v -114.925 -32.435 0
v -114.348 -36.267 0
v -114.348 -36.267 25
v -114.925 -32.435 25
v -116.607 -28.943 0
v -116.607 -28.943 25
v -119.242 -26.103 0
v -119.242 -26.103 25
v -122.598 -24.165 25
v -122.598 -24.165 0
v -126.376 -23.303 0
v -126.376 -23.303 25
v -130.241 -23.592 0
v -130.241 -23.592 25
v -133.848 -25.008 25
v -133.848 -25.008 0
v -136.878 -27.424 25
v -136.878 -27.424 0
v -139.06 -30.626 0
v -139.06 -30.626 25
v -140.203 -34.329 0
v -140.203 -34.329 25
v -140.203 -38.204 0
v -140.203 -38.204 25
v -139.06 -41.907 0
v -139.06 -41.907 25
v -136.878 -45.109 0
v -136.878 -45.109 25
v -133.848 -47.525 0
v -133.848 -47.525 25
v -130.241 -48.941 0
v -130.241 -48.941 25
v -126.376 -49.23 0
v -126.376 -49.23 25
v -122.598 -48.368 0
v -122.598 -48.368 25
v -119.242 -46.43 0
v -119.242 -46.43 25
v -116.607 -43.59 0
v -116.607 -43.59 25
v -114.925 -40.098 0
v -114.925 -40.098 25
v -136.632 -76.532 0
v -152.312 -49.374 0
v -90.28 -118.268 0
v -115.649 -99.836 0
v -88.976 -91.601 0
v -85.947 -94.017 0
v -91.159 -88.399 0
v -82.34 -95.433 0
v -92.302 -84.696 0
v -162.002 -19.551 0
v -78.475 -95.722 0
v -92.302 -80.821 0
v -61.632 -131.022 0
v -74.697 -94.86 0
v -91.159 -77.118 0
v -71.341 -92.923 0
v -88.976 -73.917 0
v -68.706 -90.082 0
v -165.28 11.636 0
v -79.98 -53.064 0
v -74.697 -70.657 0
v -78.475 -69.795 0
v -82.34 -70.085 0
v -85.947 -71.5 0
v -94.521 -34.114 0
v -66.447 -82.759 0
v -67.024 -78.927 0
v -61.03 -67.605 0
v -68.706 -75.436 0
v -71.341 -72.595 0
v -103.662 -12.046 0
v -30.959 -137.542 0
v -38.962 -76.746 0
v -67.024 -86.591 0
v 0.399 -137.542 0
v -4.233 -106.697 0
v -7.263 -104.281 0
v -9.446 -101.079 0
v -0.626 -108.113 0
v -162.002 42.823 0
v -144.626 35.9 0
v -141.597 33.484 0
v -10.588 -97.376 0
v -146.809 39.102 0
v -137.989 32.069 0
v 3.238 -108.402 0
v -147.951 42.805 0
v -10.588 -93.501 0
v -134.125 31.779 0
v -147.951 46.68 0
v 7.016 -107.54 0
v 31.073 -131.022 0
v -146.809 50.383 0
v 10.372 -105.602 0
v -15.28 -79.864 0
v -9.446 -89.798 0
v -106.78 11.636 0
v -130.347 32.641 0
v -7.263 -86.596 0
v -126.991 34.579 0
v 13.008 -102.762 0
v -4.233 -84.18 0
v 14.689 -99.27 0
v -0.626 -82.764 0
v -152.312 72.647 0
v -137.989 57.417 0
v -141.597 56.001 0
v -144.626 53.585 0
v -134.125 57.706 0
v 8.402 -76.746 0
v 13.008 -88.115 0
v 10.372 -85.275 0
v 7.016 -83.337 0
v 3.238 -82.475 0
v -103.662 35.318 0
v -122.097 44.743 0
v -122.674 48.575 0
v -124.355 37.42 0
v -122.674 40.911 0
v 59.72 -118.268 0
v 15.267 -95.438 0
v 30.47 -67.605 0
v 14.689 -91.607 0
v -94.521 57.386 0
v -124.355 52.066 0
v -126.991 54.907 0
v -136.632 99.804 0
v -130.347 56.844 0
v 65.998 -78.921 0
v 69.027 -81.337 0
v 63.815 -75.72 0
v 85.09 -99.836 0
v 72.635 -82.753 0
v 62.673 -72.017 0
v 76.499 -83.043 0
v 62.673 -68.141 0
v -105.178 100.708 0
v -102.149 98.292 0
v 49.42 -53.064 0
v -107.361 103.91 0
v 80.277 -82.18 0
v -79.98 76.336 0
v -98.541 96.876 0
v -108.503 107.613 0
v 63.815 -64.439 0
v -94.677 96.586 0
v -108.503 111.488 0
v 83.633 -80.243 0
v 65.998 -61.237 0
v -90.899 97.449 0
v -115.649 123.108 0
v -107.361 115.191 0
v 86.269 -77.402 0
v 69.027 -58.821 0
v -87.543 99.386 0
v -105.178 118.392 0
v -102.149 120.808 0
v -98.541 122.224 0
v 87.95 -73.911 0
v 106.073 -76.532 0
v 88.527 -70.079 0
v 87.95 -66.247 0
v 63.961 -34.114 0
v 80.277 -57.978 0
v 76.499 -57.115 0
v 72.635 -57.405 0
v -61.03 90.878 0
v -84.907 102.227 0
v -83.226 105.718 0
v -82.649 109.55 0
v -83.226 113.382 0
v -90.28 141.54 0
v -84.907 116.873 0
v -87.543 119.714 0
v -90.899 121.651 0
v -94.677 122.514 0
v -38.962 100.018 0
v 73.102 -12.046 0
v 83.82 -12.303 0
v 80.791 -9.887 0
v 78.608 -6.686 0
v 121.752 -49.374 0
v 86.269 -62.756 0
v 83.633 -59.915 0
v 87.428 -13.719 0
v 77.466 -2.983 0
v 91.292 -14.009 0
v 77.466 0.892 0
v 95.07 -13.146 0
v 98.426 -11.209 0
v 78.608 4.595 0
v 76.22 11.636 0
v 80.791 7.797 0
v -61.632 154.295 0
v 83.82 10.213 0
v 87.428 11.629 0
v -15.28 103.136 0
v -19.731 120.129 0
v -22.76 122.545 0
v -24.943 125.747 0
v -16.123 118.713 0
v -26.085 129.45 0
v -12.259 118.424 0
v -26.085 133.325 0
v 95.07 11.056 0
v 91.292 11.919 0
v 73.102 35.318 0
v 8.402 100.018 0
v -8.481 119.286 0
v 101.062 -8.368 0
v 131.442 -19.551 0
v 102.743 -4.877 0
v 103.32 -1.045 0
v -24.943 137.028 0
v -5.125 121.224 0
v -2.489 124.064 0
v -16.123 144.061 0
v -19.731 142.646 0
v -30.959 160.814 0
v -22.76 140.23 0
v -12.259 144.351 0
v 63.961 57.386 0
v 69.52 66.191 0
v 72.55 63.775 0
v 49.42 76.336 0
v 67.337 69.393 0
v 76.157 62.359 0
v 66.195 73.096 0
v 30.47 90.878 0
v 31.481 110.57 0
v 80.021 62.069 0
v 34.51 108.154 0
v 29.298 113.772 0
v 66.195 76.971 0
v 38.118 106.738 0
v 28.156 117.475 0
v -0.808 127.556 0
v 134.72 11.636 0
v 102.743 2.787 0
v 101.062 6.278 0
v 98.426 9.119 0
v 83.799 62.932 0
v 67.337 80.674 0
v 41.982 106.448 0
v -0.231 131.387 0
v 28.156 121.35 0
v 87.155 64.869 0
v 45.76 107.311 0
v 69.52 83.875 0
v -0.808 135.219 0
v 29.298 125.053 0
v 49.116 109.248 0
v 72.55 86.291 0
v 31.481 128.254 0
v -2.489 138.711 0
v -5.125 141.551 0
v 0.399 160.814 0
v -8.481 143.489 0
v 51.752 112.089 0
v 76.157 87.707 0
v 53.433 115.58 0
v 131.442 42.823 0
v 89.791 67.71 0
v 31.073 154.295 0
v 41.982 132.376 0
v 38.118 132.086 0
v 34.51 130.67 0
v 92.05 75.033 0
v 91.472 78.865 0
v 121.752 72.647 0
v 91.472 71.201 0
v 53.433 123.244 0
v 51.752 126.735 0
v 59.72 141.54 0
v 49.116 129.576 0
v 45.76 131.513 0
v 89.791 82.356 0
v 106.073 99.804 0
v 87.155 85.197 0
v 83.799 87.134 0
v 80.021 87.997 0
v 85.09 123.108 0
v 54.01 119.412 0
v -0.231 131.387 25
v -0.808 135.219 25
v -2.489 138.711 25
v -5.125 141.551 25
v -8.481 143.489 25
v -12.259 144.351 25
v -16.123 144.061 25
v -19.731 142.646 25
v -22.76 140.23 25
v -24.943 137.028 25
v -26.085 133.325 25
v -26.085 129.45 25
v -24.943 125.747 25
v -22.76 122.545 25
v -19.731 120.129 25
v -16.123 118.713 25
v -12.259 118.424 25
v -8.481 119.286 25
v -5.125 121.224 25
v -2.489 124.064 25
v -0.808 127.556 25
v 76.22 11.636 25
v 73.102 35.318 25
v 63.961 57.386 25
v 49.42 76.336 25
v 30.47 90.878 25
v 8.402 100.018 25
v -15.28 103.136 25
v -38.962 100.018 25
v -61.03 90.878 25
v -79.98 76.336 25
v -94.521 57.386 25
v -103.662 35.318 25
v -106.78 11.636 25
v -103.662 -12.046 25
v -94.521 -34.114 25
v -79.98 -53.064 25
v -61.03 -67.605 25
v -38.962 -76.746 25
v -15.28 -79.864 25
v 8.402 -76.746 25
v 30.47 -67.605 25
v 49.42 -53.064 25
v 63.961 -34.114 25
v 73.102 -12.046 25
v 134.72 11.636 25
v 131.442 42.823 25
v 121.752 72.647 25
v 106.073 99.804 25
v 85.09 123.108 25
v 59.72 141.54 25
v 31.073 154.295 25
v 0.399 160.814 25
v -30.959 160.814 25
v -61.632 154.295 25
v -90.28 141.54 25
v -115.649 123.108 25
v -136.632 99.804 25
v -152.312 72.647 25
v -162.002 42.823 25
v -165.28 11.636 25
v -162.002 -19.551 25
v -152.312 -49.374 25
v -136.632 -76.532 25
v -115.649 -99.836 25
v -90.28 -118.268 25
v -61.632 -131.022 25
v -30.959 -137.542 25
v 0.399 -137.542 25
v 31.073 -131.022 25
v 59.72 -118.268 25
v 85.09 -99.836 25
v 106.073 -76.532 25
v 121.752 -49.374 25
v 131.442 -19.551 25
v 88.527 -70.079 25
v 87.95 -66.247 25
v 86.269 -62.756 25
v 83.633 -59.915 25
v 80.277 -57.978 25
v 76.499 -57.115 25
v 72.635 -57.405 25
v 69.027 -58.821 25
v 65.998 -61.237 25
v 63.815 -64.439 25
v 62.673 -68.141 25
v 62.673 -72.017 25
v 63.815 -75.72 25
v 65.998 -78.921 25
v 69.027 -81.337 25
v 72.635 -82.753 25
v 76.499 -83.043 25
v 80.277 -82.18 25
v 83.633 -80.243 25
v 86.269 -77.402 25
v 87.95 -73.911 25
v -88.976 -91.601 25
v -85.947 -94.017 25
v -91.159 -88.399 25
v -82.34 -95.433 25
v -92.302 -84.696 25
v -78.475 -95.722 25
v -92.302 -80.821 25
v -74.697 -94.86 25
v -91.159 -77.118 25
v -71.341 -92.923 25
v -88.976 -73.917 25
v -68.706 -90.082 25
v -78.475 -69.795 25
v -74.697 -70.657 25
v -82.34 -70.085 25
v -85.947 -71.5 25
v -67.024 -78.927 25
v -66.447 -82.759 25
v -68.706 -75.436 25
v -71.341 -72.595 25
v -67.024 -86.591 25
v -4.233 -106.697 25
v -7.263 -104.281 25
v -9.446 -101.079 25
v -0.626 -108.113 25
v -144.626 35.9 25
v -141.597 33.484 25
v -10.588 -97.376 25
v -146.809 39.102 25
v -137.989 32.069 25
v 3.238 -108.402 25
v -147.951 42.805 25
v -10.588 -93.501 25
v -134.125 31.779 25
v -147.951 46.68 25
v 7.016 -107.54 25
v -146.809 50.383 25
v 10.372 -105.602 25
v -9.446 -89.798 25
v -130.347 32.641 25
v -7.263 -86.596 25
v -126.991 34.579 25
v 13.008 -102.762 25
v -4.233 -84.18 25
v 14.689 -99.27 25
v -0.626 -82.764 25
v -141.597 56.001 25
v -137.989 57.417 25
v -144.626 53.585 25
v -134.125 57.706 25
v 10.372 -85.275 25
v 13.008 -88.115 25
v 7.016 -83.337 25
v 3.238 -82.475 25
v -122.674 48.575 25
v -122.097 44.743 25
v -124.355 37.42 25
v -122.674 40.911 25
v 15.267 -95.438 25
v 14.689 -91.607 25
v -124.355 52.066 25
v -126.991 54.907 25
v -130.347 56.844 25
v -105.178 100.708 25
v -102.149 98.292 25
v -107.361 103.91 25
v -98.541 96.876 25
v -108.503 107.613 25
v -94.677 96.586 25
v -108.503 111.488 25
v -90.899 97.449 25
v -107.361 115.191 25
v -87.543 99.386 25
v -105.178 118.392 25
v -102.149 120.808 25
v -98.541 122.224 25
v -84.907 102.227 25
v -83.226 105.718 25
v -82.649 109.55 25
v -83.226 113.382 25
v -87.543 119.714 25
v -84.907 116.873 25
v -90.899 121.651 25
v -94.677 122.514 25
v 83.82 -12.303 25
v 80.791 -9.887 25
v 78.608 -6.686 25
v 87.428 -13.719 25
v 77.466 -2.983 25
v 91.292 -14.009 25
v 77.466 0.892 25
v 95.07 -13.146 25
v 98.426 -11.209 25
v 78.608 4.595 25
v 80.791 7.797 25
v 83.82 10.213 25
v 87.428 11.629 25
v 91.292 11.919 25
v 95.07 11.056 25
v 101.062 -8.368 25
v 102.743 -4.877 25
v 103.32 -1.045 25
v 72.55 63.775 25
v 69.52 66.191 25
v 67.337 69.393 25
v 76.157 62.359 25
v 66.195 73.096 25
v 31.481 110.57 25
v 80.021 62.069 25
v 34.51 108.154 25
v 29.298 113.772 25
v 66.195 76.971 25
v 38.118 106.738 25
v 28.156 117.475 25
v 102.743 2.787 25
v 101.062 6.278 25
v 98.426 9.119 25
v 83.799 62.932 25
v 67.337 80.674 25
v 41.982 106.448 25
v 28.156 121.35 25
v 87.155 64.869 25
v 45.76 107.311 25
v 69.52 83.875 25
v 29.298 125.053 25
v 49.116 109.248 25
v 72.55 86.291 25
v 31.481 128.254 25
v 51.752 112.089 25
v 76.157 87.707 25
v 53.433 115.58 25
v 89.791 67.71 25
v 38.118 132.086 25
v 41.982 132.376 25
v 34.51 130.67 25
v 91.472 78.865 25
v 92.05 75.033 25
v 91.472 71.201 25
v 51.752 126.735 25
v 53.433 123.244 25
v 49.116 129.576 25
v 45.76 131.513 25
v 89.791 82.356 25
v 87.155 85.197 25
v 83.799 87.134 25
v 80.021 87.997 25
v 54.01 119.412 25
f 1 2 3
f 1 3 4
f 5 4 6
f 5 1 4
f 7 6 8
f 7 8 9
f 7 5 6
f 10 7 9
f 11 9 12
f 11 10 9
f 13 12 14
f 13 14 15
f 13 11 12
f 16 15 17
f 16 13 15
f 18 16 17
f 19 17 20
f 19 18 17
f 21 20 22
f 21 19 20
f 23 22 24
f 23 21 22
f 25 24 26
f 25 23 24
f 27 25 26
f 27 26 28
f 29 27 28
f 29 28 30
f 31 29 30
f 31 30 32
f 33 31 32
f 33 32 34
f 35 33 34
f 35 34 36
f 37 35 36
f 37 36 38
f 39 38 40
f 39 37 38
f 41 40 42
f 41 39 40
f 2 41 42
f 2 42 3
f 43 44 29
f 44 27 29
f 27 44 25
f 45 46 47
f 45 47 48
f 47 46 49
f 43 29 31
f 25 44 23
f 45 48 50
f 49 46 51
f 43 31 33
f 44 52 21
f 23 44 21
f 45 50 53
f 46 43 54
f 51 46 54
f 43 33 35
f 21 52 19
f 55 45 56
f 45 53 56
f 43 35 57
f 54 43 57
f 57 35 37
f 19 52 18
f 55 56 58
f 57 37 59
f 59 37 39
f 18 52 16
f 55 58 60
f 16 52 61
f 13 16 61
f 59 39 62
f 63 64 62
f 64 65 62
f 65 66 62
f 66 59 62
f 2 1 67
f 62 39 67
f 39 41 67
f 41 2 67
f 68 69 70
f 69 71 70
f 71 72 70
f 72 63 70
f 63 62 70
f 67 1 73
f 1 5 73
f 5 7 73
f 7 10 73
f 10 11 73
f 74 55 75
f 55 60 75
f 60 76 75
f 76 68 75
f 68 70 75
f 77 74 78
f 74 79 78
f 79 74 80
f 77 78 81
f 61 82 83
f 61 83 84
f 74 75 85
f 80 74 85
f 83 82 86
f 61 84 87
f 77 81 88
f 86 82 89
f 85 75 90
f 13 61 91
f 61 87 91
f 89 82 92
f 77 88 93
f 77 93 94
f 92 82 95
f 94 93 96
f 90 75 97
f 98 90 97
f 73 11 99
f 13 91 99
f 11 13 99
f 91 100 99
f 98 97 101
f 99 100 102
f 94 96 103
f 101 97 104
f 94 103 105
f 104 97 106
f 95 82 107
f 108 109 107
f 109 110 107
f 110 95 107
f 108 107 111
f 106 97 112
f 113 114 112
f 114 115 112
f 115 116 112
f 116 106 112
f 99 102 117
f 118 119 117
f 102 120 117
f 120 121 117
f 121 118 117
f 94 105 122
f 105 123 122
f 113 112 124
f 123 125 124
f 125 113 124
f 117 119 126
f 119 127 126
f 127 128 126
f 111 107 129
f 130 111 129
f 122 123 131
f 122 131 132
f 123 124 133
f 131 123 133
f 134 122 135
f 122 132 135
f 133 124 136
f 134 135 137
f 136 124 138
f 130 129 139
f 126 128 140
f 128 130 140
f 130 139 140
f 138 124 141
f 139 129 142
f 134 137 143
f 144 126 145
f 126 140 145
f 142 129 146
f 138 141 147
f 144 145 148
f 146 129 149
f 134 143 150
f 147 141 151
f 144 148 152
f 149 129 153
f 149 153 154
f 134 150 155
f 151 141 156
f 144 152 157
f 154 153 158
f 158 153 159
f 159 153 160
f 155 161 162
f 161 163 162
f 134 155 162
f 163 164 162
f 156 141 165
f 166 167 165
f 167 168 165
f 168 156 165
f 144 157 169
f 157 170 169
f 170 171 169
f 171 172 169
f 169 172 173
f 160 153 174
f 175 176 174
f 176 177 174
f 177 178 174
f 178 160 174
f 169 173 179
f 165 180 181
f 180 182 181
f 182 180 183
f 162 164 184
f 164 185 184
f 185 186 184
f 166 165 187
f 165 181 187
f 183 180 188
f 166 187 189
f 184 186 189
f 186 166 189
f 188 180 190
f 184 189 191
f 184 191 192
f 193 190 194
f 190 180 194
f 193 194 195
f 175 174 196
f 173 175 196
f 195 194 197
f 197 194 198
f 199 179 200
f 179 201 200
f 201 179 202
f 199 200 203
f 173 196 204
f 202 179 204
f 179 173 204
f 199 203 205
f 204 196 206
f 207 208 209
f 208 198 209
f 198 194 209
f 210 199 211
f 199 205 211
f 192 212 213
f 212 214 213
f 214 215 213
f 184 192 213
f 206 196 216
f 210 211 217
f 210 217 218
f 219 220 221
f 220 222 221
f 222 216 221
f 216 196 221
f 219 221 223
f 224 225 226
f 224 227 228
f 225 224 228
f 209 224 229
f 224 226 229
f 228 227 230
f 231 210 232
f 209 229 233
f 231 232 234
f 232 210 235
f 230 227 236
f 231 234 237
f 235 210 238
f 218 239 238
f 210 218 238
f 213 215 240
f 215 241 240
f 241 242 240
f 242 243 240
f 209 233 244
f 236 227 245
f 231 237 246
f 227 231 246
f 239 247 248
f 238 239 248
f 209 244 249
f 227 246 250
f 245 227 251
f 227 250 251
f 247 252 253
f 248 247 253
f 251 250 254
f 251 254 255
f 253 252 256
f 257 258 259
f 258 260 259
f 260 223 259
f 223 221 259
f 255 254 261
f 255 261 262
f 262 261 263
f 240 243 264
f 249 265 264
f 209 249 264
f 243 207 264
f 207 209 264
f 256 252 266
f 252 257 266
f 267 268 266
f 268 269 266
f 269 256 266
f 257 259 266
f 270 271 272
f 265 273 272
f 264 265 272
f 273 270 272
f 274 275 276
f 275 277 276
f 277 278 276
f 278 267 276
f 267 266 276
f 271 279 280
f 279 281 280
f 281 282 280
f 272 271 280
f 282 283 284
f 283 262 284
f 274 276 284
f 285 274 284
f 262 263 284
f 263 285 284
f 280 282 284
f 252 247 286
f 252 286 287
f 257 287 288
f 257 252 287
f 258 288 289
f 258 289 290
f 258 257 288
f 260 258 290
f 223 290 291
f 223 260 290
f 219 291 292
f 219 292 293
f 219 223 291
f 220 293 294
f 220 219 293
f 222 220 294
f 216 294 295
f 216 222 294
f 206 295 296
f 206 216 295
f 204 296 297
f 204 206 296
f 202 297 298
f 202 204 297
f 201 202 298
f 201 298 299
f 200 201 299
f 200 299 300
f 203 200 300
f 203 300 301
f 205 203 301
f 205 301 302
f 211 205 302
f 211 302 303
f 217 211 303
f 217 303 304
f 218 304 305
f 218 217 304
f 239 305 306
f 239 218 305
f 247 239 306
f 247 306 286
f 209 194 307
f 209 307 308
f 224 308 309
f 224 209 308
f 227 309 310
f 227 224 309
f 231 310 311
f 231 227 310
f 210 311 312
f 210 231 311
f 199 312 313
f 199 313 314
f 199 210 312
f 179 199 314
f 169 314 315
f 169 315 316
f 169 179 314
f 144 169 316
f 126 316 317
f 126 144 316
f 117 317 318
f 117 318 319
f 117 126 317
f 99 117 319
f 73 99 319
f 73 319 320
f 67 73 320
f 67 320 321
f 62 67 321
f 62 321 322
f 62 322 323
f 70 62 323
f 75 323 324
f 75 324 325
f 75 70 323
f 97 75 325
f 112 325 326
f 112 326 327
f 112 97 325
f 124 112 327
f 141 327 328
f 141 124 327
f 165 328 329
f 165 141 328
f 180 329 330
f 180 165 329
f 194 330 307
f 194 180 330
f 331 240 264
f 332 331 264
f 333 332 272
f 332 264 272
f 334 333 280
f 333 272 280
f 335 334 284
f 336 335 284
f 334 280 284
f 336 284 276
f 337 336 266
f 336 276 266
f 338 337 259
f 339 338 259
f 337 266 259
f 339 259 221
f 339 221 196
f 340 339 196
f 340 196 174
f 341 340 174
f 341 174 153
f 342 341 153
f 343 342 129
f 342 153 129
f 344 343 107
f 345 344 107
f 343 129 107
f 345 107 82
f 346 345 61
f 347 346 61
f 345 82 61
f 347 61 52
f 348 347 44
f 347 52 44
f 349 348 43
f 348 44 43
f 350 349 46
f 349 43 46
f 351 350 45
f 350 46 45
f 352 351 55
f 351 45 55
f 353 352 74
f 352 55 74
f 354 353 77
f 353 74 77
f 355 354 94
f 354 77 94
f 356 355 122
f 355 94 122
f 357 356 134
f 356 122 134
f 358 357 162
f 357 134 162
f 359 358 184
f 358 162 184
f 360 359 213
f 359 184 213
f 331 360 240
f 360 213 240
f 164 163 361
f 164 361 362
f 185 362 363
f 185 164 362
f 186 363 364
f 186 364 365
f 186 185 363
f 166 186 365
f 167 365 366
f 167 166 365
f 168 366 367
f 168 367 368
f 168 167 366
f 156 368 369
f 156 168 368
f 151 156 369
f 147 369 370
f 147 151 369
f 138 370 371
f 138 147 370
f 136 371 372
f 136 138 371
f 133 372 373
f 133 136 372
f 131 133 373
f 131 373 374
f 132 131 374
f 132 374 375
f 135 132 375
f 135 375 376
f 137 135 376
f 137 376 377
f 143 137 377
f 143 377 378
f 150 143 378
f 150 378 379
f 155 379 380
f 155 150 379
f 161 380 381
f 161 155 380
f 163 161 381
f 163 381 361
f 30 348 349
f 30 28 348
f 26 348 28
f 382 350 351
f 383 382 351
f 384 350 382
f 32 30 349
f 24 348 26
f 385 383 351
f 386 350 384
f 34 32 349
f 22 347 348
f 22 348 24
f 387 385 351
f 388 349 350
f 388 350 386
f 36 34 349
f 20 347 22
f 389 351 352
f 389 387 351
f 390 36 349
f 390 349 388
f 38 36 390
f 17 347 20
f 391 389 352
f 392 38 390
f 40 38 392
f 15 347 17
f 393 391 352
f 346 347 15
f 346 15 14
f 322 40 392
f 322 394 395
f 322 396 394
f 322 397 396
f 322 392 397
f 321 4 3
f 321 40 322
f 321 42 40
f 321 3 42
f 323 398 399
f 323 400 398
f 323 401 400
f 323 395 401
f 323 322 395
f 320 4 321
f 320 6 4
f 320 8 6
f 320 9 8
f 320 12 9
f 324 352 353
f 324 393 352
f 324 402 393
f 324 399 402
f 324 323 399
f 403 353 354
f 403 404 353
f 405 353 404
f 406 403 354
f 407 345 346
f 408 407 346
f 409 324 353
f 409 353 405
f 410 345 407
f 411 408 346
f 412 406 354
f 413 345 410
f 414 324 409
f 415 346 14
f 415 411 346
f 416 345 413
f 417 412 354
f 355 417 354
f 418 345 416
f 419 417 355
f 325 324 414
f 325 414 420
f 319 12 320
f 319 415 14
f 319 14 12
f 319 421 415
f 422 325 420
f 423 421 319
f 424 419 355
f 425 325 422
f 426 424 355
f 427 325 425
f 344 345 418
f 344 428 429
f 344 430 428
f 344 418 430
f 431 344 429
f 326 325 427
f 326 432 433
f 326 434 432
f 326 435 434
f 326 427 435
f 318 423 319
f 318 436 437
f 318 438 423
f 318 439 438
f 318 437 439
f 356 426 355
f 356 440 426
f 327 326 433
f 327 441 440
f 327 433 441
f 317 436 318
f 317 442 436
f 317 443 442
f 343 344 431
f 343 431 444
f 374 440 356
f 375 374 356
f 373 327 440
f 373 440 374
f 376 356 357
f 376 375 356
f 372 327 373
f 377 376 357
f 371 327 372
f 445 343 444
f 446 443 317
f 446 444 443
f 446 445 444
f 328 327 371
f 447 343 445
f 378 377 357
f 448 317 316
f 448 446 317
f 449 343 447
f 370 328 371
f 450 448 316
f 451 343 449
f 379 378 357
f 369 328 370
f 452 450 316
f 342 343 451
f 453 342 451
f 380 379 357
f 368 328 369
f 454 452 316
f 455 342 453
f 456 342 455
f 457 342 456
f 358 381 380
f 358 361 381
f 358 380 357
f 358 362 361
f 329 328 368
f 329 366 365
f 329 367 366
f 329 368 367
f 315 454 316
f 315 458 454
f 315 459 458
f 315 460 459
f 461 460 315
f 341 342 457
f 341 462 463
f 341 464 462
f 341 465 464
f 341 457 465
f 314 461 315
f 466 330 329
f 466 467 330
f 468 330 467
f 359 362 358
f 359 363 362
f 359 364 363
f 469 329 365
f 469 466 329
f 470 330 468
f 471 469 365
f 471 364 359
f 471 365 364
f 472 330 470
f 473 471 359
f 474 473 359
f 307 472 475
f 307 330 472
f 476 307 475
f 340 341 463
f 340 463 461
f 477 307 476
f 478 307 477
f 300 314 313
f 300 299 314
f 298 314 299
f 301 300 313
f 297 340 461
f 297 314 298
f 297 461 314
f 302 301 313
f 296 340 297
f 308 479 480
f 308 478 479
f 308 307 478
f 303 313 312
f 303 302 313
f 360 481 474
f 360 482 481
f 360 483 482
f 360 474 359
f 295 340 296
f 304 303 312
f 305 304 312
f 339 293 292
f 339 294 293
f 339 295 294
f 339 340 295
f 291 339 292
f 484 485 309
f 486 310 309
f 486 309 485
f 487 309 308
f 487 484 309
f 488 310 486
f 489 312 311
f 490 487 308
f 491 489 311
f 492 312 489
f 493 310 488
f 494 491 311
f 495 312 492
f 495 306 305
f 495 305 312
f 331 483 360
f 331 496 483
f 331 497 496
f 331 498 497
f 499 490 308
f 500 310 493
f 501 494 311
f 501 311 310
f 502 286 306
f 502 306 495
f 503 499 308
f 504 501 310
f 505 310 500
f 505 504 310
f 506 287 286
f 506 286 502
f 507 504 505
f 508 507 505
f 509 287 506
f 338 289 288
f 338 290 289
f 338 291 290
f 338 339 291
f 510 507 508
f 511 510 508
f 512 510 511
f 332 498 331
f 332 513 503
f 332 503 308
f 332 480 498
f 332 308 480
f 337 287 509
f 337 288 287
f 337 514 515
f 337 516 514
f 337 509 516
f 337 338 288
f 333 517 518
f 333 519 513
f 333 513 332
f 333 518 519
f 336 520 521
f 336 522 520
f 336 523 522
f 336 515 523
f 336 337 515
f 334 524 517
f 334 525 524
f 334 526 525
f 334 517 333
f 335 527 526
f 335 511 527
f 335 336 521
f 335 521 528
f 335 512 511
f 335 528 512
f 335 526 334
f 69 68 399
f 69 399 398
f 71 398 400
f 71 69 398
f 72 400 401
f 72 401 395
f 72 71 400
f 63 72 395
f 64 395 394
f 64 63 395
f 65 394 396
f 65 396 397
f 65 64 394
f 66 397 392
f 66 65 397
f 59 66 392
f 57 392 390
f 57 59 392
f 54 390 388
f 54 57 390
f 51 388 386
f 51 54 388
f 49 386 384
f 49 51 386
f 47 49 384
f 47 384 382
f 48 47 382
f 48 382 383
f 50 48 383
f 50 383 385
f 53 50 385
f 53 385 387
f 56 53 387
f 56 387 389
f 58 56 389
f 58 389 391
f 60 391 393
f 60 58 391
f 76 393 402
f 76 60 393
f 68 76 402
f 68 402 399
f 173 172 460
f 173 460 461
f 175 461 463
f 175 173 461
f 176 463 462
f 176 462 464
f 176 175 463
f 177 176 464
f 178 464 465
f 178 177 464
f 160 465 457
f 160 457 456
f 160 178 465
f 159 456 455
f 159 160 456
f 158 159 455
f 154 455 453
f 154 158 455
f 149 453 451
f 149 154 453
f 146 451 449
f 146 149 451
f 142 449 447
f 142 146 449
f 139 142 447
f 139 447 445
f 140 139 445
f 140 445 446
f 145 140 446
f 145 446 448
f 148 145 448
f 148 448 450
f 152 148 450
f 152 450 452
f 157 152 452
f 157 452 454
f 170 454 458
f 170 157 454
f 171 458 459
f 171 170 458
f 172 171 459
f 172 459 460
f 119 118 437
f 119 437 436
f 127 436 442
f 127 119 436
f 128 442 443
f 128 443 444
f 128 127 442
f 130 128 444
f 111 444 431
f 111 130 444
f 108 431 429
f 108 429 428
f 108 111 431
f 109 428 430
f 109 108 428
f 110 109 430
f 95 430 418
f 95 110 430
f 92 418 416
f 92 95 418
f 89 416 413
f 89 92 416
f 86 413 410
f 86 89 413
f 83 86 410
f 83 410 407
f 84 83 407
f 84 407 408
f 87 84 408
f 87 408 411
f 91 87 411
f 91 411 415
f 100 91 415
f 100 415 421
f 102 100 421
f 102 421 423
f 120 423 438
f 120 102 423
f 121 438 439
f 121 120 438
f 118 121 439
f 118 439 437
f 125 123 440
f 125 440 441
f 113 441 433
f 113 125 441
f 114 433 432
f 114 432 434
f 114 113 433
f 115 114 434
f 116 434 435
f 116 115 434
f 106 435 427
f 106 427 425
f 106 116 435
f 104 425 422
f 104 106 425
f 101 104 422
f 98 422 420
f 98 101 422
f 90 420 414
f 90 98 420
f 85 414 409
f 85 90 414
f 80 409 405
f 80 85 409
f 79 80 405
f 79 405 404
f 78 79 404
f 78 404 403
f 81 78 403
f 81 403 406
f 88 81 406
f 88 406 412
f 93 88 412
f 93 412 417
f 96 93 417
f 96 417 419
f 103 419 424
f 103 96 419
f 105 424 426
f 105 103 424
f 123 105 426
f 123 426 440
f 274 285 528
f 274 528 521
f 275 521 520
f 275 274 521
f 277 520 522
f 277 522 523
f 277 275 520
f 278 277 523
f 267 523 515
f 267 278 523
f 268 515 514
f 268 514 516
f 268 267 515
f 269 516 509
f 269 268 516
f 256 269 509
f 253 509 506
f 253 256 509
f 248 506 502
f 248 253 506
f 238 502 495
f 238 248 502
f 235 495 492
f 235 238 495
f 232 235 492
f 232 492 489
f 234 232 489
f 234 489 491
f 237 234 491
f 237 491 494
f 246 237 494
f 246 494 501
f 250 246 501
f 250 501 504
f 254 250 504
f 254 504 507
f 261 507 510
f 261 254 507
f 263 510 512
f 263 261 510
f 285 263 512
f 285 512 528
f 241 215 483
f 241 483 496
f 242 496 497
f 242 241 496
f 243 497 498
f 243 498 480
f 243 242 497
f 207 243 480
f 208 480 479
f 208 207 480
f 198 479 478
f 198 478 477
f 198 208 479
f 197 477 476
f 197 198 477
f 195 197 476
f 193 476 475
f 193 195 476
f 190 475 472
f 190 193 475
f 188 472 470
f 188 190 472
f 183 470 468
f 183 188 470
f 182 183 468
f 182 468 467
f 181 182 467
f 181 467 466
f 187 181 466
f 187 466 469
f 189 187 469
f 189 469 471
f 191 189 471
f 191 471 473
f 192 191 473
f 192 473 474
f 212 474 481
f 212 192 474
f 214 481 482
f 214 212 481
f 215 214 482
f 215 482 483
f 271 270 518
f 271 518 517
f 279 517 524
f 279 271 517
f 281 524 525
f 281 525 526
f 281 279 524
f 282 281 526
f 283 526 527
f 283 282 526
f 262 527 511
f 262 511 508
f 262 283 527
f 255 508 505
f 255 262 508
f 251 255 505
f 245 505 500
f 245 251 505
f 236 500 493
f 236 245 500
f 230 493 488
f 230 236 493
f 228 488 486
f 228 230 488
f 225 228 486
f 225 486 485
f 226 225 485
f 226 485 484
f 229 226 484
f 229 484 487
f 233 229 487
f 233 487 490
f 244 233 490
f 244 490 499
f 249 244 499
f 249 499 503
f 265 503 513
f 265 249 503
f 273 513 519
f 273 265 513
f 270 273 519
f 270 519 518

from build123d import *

# Parameters (mm, degrees)
F0_R     = 150
F0_R_2   = 13
F0_R_3   = 91.5
F1_DEPTH = 25


with BuildPart() as f1:
    # F0 (on Top) → F1 (new body)
    with BuildSketch(Plane.XY):
        with Locations((-15.279851, 11.636195)):
            Circle(F0_R)
        with Locations((-79.44674, -82.758747)):
            Circle(F0_R_2, mode=Mode.SUBTRACT)
        with Locations((-127.347842, -36.266502)):
            Circle(F0_R_2, mode=Mode.SUBTRACT)
        with Locations((2.266906, -95.438458)):
            Circle(F0_R_2, mode=Mode.SUBTRACT)
        with Locations((75.527415, -70.079044)):
            Circle(F0_R_2, mode=Mode.SUBTRACT)
        with Locations((90.320408, -1.045102)):
            Circle(F0_R_2, mode=Mode.SUBTRACT)
        with Locations((-135.09655, 44.742718)):
            Circle(F0_R_2, mode=Mode.SUBTRACT)
        with Locations((-95.648579, 109.550089)):
            Circle(F0_R_2, mode=Mode.SUBTRACT)
        with Locations((-15.279851, 11.636195)):
            Circle(F0_R_3, mode=Mode.SUBTRACT)
        with Locations((79.049557, 75.033121)):
            Circle(F0_R_2, mode=Mode.SUBTRACT)
        with Locations((41.010443, 119.412079)):
            Circle(F0_R_2, mode=Mode.SUBTRACT)
        with Locations((-13.23051, 131.387368)):
            Circle(F0_R_2, mode=Mode.SUBTRACT)
    extrude(amount=F1_DEPTH)


solid = f1.part
